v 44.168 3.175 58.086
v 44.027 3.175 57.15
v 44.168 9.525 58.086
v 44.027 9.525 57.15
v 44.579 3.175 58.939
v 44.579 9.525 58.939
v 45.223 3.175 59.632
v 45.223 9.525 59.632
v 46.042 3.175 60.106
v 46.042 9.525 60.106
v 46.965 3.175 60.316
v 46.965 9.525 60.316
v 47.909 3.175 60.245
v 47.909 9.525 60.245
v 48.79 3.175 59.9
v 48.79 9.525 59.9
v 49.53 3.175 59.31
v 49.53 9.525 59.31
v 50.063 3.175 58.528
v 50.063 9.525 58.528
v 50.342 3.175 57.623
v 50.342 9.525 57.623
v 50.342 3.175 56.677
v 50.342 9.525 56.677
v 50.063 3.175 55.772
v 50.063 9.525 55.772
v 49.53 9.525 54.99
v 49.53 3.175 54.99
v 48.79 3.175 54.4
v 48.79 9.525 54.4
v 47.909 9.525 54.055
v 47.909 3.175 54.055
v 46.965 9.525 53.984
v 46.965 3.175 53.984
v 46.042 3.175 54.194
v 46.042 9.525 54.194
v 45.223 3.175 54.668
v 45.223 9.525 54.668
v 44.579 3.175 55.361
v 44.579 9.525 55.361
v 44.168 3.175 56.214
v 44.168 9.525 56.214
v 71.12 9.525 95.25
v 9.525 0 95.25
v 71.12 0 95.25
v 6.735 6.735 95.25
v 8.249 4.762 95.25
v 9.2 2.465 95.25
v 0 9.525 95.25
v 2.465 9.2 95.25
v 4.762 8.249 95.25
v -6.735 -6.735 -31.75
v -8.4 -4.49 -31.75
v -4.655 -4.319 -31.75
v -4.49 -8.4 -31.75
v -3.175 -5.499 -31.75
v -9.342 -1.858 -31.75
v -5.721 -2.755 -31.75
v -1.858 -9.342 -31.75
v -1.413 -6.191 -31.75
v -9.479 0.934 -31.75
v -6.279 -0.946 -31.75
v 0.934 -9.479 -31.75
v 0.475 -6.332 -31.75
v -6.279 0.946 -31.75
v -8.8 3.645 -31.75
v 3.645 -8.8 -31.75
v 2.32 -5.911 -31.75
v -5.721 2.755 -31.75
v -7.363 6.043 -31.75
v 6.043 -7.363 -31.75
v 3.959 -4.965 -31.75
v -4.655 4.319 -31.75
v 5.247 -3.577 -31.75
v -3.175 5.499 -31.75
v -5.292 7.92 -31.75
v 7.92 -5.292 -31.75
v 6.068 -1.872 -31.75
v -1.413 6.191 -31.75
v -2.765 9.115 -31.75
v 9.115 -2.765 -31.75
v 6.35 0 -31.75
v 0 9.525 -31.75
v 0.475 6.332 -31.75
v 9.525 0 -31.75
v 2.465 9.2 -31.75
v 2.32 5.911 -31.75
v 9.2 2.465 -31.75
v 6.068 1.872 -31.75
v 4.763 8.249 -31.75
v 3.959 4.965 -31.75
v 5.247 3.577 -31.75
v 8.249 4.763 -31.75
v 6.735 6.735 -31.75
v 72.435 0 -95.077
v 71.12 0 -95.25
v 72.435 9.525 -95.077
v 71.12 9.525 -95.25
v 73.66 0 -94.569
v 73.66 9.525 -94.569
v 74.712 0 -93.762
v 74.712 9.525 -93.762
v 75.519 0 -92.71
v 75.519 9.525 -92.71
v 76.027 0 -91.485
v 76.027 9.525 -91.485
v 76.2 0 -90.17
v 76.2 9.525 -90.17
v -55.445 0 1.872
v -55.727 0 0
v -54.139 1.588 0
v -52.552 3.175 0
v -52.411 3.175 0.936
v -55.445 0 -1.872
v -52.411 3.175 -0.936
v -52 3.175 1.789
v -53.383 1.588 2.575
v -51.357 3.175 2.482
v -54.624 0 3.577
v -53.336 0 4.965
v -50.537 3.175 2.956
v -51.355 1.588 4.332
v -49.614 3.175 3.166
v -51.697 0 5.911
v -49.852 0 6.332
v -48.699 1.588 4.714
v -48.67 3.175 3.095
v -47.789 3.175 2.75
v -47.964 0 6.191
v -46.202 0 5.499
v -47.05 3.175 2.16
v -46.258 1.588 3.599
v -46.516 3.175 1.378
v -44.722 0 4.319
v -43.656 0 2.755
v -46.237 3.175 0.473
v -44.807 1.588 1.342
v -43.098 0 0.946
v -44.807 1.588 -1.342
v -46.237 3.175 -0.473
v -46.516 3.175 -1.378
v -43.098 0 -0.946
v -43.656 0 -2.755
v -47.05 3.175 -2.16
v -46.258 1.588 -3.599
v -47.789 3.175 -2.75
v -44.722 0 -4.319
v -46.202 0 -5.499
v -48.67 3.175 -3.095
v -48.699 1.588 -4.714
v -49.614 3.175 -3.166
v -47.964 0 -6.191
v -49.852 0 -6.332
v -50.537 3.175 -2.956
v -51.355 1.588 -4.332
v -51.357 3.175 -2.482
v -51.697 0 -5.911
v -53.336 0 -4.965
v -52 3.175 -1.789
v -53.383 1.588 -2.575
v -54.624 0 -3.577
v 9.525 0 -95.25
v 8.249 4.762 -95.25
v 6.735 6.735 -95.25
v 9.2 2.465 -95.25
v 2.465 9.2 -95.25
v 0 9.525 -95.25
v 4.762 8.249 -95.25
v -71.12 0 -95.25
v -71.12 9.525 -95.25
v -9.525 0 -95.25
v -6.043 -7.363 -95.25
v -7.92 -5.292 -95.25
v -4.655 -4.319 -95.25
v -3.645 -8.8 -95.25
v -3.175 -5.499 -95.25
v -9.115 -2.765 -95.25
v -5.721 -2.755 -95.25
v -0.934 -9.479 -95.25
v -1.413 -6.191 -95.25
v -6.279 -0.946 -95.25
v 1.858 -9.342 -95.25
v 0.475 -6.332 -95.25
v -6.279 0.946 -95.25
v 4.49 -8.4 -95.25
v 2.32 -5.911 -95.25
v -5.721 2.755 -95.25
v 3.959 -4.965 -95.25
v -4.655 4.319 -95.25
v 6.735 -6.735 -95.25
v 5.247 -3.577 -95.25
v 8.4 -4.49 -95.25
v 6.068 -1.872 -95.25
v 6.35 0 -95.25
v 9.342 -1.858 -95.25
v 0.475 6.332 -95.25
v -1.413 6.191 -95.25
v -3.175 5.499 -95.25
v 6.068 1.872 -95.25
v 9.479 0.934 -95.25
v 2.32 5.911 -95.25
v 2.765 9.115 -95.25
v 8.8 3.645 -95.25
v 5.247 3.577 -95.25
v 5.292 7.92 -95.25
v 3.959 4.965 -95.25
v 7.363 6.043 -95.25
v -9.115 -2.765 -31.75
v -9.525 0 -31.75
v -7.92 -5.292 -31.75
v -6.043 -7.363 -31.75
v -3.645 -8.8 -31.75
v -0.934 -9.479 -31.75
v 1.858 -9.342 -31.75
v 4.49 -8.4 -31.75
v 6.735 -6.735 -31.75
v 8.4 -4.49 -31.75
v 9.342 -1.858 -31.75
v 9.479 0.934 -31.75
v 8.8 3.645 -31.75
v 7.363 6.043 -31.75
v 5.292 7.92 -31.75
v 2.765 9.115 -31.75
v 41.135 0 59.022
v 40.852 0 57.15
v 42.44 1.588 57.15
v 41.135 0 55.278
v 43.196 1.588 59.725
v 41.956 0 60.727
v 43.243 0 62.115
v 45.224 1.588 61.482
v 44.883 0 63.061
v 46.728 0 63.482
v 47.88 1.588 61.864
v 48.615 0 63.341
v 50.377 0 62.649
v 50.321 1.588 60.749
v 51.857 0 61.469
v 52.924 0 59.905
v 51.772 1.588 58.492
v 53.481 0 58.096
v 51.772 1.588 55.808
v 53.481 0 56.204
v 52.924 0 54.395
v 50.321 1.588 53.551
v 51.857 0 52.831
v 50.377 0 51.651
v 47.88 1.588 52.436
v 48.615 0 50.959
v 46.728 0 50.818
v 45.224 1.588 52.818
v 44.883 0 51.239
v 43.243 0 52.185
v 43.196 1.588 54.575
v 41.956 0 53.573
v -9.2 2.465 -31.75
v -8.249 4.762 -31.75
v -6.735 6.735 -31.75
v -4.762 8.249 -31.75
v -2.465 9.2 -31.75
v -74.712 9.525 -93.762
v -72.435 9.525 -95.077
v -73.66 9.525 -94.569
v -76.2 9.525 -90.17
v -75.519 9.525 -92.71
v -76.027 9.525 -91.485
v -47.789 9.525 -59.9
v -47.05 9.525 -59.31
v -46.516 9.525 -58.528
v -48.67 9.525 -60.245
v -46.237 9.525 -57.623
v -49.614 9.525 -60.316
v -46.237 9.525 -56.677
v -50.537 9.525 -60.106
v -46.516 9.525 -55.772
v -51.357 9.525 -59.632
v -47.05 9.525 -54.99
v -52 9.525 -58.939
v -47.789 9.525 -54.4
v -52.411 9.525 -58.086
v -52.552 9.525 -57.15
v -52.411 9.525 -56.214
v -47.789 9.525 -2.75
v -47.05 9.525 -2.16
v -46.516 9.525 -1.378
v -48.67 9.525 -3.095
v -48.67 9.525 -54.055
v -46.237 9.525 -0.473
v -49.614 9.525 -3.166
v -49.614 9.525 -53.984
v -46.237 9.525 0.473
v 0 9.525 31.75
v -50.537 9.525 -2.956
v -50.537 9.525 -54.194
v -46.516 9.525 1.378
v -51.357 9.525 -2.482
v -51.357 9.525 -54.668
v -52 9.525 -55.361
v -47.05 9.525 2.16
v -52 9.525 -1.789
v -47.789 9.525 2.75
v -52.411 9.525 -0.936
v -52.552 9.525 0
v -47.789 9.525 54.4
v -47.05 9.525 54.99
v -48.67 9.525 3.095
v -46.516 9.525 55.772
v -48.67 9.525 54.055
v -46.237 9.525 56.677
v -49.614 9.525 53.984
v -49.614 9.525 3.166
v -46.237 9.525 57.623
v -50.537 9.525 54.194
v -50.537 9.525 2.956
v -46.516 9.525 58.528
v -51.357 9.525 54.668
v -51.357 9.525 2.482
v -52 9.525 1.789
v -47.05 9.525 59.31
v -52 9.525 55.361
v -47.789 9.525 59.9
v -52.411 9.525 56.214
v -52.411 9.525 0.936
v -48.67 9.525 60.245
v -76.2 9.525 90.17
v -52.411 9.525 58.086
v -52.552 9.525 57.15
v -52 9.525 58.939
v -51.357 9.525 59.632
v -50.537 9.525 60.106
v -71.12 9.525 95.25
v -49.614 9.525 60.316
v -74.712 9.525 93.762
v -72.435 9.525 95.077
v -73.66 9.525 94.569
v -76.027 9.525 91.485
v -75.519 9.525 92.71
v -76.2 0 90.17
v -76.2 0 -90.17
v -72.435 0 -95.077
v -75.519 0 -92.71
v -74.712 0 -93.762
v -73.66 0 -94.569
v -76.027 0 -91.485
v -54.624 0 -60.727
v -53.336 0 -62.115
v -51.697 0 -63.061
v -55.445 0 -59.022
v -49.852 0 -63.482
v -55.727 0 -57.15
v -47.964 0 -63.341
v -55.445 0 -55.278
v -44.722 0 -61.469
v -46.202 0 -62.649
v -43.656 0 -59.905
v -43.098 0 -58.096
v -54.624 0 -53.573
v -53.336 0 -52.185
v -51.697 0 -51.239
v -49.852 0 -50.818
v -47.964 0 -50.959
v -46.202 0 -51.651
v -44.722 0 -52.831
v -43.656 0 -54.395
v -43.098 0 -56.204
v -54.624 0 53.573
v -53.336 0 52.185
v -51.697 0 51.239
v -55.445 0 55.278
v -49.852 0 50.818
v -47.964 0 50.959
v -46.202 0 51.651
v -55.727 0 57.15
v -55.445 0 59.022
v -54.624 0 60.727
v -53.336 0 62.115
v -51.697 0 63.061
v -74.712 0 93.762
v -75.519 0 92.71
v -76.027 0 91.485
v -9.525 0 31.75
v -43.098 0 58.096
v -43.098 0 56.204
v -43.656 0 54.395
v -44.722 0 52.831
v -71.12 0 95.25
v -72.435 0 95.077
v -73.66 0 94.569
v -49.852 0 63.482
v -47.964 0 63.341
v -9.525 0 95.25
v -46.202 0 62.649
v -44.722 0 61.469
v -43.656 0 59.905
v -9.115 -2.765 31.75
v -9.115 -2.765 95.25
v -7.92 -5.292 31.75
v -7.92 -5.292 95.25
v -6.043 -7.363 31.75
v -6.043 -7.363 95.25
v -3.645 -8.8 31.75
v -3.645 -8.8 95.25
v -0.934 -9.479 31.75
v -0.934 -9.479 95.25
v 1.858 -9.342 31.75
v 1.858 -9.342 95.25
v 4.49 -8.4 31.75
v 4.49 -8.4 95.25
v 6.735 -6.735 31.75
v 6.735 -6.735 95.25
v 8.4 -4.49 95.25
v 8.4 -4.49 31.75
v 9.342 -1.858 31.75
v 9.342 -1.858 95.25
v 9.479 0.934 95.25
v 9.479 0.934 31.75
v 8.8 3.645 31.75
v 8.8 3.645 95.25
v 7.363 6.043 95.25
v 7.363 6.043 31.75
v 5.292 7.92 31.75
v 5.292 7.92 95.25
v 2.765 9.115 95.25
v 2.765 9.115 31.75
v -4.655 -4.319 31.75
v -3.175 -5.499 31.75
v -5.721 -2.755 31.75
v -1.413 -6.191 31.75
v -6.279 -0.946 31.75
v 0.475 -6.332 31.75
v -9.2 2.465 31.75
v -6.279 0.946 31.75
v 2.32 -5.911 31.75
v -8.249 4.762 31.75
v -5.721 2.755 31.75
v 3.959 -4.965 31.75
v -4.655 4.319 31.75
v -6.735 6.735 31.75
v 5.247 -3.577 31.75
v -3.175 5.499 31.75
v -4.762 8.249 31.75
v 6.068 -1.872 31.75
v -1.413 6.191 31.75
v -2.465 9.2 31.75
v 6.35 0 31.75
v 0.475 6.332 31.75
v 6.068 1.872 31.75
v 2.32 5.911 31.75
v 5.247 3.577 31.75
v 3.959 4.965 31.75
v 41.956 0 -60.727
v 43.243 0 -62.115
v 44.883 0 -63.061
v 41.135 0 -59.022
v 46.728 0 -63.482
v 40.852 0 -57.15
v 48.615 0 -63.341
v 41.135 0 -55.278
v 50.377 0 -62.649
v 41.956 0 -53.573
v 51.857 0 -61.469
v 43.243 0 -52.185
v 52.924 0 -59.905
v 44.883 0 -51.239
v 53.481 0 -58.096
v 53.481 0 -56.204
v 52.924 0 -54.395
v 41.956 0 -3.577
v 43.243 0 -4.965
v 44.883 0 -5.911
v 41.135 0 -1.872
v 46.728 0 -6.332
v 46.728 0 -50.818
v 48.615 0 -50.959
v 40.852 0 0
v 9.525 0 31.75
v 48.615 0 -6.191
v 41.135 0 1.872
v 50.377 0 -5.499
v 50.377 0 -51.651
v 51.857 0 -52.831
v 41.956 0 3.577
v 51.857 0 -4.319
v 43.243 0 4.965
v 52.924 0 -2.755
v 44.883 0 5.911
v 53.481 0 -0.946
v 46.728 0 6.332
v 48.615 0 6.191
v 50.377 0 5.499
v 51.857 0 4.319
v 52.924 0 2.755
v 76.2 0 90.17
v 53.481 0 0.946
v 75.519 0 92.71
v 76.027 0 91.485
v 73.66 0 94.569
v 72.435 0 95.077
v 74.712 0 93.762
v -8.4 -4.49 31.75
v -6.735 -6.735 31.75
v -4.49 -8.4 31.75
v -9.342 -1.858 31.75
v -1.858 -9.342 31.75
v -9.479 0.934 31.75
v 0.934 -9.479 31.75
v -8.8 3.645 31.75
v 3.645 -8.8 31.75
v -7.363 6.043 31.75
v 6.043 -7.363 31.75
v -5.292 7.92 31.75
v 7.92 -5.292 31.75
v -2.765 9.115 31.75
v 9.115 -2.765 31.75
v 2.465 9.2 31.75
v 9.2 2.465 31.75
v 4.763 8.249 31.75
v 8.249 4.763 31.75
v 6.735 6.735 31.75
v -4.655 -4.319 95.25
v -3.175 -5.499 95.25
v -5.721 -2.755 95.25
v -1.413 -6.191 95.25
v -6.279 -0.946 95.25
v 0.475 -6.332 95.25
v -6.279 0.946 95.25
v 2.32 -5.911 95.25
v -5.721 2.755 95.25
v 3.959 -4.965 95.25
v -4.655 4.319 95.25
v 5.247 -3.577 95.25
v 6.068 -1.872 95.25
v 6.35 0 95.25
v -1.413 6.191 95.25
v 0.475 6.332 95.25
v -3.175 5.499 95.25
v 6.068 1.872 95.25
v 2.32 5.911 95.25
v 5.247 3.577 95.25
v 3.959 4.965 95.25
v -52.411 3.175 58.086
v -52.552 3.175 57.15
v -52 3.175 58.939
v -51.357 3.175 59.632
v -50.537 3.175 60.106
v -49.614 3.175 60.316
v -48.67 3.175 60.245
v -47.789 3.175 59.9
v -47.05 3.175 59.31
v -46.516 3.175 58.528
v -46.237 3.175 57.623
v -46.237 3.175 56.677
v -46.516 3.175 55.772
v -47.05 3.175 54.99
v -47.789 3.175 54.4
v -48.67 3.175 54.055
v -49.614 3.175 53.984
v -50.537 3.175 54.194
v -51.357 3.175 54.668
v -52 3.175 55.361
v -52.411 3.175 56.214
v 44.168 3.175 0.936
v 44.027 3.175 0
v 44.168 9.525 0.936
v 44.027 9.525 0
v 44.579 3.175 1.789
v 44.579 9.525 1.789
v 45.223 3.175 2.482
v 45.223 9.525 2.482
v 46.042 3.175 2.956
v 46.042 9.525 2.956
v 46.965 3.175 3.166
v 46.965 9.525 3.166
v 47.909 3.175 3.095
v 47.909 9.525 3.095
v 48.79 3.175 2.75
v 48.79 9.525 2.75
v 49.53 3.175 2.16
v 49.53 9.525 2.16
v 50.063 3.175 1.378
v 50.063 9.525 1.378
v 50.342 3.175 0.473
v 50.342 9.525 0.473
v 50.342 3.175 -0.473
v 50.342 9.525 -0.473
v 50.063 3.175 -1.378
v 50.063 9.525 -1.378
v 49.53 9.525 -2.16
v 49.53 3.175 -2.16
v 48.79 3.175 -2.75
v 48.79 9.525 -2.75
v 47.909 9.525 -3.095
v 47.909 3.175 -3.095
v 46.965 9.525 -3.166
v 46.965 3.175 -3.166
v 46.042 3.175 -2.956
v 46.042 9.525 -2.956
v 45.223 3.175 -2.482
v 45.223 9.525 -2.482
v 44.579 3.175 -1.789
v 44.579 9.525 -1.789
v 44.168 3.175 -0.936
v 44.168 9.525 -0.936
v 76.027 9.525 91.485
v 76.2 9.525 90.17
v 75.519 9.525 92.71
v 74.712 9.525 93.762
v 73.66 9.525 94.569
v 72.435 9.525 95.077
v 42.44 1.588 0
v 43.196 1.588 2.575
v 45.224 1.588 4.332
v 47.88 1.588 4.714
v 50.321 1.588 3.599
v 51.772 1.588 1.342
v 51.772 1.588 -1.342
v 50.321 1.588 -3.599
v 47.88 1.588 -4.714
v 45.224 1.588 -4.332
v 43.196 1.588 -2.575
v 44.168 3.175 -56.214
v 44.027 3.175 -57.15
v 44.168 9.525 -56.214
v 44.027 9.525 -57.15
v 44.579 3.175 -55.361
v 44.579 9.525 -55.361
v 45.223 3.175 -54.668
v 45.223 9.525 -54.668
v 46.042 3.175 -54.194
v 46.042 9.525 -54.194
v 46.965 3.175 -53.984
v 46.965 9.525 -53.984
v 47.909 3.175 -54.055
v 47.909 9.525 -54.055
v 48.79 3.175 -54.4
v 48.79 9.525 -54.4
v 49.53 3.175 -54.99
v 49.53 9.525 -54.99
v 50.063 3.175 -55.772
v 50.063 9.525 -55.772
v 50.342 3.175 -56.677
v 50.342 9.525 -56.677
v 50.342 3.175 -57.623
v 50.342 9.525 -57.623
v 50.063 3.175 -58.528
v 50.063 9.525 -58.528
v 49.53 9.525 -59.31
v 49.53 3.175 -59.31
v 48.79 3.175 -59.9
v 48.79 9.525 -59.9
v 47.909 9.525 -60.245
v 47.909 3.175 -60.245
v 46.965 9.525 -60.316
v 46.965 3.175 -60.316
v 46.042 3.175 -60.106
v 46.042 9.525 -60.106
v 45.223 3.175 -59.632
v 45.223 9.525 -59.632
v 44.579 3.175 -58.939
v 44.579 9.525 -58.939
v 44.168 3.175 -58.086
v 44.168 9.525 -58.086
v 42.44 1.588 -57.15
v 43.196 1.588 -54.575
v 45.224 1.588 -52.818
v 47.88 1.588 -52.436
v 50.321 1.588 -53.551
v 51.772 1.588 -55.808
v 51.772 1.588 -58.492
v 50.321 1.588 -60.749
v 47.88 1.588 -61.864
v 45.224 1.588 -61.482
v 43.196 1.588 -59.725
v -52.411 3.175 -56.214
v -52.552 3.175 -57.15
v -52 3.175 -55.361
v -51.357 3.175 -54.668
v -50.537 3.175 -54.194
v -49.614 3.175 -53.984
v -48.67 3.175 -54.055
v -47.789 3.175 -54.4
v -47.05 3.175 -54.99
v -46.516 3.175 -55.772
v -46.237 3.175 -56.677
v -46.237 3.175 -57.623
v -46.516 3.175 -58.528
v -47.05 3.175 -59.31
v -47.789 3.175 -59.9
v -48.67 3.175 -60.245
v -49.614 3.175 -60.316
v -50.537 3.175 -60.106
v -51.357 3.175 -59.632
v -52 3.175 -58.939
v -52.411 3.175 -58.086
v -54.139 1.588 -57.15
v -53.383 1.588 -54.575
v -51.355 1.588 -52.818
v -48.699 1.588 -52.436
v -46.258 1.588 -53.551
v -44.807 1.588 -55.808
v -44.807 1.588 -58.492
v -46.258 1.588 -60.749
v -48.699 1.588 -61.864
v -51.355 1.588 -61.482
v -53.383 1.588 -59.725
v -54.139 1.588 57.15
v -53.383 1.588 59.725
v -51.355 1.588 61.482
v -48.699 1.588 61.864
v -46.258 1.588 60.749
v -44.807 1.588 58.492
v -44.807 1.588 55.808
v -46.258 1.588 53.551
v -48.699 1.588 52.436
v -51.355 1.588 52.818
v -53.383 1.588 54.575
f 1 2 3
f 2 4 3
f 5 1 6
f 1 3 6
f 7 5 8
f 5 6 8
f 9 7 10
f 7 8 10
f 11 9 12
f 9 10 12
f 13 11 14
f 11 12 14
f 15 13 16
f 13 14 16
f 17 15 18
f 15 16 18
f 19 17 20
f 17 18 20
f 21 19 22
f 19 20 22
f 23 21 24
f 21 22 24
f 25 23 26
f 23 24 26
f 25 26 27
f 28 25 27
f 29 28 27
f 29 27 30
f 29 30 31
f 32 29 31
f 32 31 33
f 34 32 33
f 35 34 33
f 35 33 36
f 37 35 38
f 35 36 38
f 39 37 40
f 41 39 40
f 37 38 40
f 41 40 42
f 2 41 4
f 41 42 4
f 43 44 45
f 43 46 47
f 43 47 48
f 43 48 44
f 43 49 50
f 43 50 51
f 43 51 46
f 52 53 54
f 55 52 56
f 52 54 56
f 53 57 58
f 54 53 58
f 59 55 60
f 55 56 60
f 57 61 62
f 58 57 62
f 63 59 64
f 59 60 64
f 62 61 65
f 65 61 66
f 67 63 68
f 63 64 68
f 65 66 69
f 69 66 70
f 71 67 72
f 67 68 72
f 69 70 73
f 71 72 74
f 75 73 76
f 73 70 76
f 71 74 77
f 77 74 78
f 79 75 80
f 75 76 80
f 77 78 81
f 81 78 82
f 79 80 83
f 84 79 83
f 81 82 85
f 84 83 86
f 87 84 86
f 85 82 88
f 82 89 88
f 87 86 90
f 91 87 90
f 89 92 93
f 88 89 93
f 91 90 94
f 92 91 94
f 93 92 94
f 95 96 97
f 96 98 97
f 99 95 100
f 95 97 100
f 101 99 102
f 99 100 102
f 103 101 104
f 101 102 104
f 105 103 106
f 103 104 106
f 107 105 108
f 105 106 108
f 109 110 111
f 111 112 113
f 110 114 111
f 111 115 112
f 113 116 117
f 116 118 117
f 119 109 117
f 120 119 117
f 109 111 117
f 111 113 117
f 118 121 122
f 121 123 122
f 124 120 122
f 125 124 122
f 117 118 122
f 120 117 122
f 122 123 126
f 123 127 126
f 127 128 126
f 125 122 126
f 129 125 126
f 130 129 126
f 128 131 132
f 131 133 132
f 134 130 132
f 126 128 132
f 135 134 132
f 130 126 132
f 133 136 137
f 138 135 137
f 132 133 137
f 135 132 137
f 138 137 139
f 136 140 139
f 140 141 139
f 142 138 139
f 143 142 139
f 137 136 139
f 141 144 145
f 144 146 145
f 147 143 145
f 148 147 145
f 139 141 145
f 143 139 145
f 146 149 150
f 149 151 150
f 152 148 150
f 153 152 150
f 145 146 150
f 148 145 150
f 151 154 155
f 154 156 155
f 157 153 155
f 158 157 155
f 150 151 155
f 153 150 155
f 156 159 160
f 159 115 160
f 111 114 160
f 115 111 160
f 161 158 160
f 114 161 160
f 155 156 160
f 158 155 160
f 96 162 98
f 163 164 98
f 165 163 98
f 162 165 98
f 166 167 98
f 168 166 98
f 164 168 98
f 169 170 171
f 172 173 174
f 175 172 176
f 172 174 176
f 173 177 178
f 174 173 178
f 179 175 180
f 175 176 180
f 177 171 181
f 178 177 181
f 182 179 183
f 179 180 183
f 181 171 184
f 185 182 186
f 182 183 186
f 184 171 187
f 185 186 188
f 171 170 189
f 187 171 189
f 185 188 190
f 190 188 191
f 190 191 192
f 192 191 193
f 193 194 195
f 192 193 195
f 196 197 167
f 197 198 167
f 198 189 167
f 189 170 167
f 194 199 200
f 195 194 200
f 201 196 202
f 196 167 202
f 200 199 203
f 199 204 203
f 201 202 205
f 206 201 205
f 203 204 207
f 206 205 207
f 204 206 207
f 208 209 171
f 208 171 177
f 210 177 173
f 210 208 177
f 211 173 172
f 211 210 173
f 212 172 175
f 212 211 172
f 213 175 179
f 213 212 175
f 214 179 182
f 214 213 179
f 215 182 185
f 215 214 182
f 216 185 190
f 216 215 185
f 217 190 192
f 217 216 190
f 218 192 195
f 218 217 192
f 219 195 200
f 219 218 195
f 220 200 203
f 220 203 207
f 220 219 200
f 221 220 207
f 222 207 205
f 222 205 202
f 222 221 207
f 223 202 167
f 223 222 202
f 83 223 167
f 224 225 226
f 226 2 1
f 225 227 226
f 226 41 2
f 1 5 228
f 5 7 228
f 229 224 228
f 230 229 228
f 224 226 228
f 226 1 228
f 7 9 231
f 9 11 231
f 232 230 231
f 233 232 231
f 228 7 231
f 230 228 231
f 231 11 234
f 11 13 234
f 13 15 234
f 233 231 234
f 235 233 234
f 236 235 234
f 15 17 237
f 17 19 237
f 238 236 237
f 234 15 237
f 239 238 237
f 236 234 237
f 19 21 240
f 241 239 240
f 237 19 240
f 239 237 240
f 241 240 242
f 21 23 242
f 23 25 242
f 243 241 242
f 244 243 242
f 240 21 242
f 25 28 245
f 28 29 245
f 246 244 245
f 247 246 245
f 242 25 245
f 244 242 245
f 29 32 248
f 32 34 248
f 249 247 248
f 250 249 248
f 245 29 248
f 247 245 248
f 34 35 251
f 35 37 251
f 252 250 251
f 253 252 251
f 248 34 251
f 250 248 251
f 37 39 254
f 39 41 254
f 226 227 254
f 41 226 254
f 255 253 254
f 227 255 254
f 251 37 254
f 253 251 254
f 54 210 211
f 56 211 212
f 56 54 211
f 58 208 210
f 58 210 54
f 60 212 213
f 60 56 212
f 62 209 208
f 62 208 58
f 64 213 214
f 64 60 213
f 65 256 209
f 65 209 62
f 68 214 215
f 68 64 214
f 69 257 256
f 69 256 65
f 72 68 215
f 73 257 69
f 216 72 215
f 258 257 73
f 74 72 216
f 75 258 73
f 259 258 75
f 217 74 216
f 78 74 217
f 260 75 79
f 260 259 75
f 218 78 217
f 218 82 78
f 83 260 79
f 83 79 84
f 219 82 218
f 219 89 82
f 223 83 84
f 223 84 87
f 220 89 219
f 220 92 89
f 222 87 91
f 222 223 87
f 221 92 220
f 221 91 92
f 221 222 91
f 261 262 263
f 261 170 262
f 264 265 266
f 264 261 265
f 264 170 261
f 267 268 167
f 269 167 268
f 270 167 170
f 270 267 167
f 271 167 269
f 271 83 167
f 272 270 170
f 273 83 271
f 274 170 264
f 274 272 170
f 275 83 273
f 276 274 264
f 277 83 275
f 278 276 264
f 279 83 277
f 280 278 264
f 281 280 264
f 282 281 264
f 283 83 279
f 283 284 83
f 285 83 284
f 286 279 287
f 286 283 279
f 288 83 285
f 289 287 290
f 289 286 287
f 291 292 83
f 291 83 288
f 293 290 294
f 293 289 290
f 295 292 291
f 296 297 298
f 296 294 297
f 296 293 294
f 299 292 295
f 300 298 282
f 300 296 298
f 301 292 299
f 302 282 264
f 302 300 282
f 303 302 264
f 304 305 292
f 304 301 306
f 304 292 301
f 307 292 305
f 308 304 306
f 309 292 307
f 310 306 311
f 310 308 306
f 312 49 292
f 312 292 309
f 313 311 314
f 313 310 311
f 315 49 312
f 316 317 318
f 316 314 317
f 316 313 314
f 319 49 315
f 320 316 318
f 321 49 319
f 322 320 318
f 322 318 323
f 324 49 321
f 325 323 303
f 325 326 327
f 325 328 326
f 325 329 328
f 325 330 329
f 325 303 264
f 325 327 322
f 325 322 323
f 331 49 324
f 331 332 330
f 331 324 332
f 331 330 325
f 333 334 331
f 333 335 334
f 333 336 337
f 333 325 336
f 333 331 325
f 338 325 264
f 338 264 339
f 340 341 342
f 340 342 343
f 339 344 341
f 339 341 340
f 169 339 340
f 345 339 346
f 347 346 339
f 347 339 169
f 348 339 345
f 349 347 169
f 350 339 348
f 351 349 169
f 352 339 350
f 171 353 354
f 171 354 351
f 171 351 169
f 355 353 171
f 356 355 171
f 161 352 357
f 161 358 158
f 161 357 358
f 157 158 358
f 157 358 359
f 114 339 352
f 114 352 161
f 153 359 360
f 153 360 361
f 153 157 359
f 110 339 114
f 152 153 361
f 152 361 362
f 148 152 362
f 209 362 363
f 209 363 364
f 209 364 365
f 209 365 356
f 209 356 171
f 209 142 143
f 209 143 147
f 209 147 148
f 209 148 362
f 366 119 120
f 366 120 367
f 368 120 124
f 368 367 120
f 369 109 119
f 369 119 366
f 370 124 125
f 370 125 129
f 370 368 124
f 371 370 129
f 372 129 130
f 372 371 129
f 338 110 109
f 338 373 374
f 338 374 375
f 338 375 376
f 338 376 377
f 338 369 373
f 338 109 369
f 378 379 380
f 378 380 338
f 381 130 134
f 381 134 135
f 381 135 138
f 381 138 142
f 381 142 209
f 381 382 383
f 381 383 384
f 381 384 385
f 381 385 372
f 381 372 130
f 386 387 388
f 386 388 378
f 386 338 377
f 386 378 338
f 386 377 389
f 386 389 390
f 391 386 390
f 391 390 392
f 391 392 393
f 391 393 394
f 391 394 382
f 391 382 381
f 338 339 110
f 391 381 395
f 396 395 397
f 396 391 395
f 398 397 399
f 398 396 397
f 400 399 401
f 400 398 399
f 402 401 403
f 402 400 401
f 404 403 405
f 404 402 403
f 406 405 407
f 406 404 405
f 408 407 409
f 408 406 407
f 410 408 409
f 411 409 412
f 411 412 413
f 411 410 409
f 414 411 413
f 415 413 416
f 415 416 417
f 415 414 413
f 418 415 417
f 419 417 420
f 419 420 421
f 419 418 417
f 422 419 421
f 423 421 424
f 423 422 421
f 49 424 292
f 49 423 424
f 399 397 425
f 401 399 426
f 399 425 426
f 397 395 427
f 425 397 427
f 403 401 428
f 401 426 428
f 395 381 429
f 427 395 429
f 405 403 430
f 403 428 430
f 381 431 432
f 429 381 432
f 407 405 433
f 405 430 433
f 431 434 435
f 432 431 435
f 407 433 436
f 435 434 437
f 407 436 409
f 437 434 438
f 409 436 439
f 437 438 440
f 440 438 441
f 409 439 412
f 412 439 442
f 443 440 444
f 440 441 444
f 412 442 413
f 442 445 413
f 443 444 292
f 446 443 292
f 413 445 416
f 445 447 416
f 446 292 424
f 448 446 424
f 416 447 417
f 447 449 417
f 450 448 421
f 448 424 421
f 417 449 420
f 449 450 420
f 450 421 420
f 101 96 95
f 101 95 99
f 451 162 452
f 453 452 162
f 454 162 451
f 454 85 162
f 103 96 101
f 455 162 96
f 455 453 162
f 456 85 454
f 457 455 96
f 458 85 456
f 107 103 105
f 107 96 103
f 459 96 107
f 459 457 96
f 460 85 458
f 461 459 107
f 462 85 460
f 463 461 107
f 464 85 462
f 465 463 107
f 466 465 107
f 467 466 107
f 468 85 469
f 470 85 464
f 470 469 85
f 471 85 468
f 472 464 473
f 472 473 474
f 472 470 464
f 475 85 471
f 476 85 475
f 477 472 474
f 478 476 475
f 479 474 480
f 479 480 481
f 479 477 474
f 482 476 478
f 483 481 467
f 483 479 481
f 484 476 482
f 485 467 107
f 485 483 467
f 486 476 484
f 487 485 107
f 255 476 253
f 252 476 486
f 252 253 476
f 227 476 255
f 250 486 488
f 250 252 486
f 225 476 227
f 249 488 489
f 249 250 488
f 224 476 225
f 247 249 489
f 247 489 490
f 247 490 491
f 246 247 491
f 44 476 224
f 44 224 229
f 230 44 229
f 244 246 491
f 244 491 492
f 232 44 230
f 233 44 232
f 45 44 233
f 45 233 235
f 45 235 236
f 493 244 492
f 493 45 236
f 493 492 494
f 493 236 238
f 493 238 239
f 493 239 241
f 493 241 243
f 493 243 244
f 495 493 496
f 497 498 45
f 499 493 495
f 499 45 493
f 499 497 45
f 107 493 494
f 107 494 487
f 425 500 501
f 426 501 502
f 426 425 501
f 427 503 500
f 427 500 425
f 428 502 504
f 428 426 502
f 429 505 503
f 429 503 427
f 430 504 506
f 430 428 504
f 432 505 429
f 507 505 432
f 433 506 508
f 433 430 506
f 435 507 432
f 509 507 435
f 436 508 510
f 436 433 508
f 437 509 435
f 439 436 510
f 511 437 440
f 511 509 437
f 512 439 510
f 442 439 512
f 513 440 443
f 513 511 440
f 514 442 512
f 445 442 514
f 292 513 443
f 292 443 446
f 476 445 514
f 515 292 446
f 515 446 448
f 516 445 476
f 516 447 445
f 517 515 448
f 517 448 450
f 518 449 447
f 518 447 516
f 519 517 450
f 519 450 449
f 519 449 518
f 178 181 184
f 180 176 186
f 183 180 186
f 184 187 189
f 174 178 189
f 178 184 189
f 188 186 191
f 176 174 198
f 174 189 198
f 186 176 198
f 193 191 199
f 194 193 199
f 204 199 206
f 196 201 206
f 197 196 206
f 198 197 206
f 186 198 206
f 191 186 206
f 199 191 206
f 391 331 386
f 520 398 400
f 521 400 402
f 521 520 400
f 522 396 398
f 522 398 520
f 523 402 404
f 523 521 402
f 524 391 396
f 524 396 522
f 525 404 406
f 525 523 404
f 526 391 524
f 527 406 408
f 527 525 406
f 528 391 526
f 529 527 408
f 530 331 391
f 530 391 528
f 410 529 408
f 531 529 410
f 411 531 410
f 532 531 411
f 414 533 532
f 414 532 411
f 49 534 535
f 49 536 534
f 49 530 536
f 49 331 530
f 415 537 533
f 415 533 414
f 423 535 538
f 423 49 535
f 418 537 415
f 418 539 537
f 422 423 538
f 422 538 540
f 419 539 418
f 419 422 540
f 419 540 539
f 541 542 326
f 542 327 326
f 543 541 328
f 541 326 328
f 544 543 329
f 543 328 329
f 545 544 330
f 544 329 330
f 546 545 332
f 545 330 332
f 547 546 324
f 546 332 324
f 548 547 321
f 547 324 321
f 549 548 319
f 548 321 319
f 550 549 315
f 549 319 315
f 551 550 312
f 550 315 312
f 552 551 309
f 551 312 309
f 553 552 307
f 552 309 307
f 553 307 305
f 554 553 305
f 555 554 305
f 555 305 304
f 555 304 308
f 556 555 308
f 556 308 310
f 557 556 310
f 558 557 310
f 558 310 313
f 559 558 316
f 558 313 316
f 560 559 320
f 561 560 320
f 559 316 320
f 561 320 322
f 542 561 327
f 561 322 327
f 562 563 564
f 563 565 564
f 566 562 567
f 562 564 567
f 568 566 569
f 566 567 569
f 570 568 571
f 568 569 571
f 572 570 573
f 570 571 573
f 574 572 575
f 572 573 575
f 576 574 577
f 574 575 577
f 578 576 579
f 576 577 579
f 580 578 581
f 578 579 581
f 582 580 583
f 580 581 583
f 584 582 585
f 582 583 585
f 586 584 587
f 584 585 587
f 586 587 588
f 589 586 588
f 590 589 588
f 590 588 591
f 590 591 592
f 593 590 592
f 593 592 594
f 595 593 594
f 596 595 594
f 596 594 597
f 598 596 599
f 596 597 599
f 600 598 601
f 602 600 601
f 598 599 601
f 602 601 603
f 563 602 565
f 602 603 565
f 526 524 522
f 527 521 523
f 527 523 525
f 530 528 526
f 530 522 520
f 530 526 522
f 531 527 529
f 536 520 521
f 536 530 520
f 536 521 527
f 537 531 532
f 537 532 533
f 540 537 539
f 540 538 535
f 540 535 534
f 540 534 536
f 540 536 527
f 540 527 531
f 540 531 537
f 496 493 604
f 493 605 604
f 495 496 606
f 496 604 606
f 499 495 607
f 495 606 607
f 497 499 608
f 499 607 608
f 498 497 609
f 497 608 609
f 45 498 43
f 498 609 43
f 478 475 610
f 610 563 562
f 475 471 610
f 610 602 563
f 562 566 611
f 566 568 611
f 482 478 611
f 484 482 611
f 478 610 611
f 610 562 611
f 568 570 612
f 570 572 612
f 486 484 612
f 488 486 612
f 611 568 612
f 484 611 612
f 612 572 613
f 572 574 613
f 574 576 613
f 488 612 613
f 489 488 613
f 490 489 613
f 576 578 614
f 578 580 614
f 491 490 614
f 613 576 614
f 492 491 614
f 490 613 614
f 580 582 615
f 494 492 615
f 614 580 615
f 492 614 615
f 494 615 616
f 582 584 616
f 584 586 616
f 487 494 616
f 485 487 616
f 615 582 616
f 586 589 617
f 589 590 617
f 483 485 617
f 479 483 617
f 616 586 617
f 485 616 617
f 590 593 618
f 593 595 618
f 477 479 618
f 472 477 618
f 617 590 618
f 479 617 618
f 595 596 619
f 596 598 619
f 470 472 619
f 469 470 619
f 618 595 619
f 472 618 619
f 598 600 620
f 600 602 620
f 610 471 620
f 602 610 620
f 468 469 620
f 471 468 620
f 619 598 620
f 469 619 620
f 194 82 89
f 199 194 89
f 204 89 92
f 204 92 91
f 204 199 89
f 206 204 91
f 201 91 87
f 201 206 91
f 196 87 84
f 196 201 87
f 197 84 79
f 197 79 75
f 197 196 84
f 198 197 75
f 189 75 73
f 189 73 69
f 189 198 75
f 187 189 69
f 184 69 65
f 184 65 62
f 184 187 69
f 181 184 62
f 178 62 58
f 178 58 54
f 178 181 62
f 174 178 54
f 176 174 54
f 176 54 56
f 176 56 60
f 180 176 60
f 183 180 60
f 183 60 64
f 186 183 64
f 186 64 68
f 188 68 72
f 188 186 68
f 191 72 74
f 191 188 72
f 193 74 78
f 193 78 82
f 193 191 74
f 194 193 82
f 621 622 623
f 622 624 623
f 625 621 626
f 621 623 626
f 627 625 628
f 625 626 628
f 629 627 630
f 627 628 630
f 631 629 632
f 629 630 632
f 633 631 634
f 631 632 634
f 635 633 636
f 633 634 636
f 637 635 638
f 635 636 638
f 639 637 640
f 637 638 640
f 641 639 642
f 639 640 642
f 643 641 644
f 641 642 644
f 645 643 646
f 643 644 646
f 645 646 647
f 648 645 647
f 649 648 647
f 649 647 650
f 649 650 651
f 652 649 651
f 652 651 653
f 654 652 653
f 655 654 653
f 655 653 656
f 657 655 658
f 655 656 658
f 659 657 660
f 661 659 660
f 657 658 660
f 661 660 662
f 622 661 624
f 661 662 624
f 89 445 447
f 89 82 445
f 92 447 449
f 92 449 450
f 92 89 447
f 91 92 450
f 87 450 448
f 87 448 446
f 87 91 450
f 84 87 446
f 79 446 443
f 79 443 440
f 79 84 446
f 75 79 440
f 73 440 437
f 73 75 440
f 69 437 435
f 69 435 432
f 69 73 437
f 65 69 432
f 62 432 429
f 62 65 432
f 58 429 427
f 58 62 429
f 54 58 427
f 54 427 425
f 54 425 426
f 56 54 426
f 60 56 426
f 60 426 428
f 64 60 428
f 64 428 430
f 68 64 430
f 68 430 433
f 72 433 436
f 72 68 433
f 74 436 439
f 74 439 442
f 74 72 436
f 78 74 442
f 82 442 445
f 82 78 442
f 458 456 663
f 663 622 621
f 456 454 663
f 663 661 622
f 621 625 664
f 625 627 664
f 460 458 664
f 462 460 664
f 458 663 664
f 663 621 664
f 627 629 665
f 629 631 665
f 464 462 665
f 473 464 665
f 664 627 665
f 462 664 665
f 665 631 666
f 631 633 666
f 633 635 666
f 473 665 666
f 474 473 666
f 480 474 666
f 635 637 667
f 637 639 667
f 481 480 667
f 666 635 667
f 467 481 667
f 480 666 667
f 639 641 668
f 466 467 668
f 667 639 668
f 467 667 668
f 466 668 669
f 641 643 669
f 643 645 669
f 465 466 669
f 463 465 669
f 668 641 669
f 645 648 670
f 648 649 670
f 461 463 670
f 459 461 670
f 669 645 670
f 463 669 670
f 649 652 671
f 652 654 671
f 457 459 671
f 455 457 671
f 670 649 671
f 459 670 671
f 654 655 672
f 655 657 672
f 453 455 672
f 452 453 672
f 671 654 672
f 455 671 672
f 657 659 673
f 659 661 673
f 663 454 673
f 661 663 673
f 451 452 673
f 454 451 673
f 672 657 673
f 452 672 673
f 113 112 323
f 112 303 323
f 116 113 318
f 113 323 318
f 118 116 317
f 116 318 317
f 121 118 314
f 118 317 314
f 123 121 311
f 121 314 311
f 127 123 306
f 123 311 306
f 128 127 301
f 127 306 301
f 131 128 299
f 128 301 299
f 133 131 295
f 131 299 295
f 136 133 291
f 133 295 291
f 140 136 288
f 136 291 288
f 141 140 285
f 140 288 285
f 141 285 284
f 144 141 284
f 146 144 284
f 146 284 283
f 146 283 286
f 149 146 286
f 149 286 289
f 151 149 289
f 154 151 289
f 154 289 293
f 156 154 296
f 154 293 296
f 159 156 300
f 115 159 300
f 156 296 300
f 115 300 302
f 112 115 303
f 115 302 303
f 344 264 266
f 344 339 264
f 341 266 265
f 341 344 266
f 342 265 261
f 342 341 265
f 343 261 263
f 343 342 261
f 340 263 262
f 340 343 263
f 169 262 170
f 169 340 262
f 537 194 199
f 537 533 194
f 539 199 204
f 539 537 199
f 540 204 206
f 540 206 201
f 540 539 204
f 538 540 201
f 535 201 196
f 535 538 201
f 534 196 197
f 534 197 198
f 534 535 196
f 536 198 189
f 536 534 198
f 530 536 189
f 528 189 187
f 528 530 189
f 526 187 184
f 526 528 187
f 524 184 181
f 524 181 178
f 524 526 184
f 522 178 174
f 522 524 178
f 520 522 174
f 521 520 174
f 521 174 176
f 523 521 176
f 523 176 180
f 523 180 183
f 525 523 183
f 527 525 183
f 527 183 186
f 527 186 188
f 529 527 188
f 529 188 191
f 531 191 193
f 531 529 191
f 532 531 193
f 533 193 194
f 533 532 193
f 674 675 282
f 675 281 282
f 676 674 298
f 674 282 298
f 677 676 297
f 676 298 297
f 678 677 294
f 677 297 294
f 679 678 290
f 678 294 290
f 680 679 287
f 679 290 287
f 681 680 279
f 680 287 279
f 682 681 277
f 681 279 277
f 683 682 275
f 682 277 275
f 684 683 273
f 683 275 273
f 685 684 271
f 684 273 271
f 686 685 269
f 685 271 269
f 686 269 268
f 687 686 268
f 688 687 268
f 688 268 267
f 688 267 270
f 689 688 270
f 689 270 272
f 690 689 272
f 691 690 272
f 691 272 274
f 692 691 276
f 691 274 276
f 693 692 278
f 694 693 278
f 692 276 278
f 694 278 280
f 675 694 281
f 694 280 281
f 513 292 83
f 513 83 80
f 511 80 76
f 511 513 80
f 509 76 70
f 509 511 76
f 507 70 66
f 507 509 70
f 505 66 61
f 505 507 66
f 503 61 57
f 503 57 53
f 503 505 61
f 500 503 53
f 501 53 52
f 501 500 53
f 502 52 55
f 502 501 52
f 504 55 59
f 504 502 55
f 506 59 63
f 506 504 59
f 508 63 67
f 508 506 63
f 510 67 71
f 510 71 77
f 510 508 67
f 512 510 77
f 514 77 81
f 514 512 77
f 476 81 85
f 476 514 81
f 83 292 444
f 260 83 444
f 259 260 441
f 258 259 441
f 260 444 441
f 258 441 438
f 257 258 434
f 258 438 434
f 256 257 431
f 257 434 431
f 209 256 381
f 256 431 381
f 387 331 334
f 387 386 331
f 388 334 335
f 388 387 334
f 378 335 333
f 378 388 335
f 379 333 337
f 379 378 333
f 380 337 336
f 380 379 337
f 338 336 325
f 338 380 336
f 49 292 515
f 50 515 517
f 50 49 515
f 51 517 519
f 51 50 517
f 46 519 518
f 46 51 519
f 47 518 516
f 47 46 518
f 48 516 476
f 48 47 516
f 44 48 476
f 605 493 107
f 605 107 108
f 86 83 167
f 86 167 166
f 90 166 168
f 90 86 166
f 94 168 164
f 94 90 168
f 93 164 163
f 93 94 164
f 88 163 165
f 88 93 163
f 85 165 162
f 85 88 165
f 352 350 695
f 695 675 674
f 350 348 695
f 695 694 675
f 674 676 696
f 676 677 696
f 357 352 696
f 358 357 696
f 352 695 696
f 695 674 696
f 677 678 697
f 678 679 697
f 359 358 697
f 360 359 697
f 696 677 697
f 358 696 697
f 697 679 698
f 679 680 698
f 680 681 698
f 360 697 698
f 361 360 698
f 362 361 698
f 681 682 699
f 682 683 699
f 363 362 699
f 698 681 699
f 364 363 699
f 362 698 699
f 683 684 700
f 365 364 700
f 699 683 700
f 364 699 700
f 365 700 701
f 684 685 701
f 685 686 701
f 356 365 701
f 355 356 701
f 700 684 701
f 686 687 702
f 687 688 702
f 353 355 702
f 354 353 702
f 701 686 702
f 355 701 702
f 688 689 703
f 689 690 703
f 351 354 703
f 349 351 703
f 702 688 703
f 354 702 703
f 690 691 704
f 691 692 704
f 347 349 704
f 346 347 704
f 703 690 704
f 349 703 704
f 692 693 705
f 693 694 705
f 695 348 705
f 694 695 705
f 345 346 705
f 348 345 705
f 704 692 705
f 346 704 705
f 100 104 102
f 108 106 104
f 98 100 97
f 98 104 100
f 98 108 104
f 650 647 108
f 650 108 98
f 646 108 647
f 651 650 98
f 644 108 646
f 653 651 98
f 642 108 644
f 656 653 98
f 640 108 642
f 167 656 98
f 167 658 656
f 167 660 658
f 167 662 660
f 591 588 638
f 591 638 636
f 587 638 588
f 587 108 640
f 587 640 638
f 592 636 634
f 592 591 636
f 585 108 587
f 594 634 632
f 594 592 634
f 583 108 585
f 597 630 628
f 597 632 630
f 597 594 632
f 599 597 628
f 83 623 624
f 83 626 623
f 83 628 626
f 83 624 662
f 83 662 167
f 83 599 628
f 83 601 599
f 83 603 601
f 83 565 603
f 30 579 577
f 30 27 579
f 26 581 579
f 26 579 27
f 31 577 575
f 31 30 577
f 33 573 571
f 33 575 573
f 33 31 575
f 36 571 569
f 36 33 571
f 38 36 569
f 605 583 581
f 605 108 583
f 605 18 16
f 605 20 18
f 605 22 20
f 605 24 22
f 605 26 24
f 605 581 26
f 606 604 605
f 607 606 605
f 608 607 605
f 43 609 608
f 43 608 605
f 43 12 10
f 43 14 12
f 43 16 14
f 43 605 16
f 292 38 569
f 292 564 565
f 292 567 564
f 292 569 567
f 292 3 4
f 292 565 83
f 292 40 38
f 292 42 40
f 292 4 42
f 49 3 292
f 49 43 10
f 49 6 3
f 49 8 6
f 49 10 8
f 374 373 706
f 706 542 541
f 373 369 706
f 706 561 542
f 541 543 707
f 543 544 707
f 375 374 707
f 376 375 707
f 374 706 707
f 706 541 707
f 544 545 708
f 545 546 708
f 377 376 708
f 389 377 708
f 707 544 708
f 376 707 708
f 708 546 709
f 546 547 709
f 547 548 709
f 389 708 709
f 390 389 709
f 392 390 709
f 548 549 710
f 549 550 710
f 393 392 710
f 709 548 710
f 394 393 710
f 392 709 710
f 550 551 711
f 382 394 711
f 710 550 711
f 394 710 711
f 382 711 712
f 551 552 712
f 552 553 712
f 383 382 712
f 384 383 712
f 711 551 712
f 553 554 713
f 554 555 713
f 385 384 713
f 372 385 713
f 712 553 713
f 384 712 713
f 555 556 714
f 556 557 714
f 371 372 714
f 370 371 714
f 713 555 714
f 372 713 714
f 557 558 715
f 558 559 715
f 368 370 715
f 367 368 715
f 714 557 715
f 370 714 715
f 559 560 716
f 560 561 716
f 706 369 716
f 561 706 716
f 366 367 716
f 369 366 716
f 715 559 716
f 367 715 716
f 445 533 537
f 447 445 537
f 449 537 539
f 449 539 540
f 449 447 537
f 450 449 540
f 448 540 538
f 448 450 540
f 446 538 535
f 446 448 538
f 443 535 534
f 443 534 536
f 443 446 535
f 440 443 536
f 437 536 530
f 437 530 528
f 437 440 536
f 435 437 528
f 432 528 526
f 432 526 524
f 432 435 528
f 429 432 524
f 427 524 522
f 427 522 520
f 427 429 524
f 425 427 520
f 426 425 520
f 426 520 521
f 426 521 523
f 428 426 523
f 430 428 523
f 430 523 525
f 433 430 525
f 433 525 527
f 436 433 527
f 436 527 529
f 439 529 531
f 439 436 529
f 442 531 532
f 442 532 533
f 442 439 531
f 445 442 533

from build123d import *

# Parameters (mm, degrees)
F0_R             = 6.35
F1_DEPTH         = 95.25
F2_DEPTH         = 31.75
F3_DEPTH         = 31.75
F4_DEPTH         = 95.25
F6_D             = 6.35
F6_CSINK_D       = 12.7
F6_CSINK_ANGLE   = 90
F6_2_D           = 6.35
F6_2_CSINK_D     = 12.7
F6_2_CSINK_ANGLE = 90
F7_DEPTH         = 95.25
F8_R             = 5.08
F8_2_R           = 5.08


with BuildPart() as f1:
    # F0 (on Top) → F1 (new body, symmetric)
    with BuildSketch(Plane.XY):
        with BuildLine():
            ThreePointArc((-9.525, 0), (-6.7351920908, 6.7351920908), (0, 9.525))
            Line((0, 9.525), (-76.2, 9.525))
            Line((-76.2, 9.525), (-76.2, 0))
            Line((-76.2, 0), (-9.525, 0))
        make_face()
        with BuildLine():
            ThreePointArc((-9.525, 0), (0, -9.525), (9.525, 0))
            ThreePointArc((9.525, 0), (6.7351920908, 6.7351920908), (0, 9.525))
            ThreePointArc((0, 9.525), (-6.7351920908, 6.7351920908), (-9.525, 0))
        make_face()
        Circle(F0_R, mode=Mode.SUBTRACT)
    extrude(amount=F1_DEPTH, both=True)

    # F0 (on Top) → F2 (cut, symmetric)
    with BuildSketch(Plane.XY):
        with BuildLine():
            ThreePointArc((-9.525, 0), (0, -9.525), (9.525, 0))
            ThreePointArc((9.525, 0), (6.7351920908, 6.7351920908), (0, 9.525))
            ThreePointArc((0, 9.525), (-6.7351920908, 6.7351920908), (-9.525, 0))
        make_face()
        Circle(F0_R, mode=Mode.SUBTRACT)
    extrude(amount=F2_DEPTH, both=True, mode=Mode.SUBTRACT)

    # F6 (through all)
    with Locations(Plane.XZ):
        with Locations((-49.3769919423, 57.15), (47.2024205584, 57.15), (47.2024205584, 0), (-49.3769919423, 0), (-49.3769919423, -57.15), (47.2024205584, -57.15)):
            CounterSinkHole(F6_D / 2, F6_CSINK_D / 2, counter_sink_angle=F6_CSINK_ANGLE)

    # F8
    f8_edges = [f1.edges().sort_by_distance(p)[0] for p in [
        (-76.2, 4.7625, -95.25),
        (-76.2, 4.7625, 95.25),
    ]]
    fillet(f8_edges, radius=F8_R)


with BuildPart() as f3:
    # F0 (on Top) → F3 (new body, symmetric)
    with BuildSketch(Plane.XY):
        with BuildLine():
            ThreePointArc((-9.525, 0), (0, -9.525), (9.525, 0))
            ThreePointArc((9.525, 0), (6.7351920908, 6.7351920908), (0, 9.525))
            ThreePointArc((0, 9.525), (-6.7351920908, 6.7351920908), (-9.525, 0))
        make_face()
        Circle(F0_R, mode=Mode.SUBTRACT)
    extrude(amount=F3_DEPTH, both=True)

    # F0 (on Top) → F4 (join, symmetric)
    with BuildSketch(Plane.XY):
        with BuildLine():
            ThreePointArc((0, 9.525), (6.7351920908, 6.7351920908), (9.525, 0))
            Line((9.525, 0), (76.2, 0))
            Line((76.2, 0), (76.2, 9.525))
            Line((76.2, 9.525), (0, 9.525))
        make_face()
    extrude(amount=F4_DEPTH, both=True)

    # F6#2 (through all)
    with Locations(Plane.XZ):
        with Locations((-49.3769919423, 57.15), (47.2024205584, 57.15), (47.2024205584, 0), (-49.3769919423, 0), (-49.3769919423, -57.15), (47.2024205584, -57.15)):
            CounterSinkHole(F6_2_D / 2, F6_2_CSINK_D / 2, counter_sink_angle=F6_2_CSINK_ANGLE)

    # F8#2
    f8_2_edges = [f3.edges().sort_by_distance(p)[0] for p in [
        (76.2, 4.7625, 95.25),
        (76.2, 4.7625, -95.25),
    ]]
    fillet(f8_2_edges, radius=F8_2_R)


with BuildPart() as f7:
    # F0 (on Top) → F7 (new body, symmetric)
    with BuildSketch(Plane.XY):
        Circle(F0_R)
    extrude(amount=F7_DEPTH, both=True)


solid = Compound([f1.part, f3.part, f7.part])
